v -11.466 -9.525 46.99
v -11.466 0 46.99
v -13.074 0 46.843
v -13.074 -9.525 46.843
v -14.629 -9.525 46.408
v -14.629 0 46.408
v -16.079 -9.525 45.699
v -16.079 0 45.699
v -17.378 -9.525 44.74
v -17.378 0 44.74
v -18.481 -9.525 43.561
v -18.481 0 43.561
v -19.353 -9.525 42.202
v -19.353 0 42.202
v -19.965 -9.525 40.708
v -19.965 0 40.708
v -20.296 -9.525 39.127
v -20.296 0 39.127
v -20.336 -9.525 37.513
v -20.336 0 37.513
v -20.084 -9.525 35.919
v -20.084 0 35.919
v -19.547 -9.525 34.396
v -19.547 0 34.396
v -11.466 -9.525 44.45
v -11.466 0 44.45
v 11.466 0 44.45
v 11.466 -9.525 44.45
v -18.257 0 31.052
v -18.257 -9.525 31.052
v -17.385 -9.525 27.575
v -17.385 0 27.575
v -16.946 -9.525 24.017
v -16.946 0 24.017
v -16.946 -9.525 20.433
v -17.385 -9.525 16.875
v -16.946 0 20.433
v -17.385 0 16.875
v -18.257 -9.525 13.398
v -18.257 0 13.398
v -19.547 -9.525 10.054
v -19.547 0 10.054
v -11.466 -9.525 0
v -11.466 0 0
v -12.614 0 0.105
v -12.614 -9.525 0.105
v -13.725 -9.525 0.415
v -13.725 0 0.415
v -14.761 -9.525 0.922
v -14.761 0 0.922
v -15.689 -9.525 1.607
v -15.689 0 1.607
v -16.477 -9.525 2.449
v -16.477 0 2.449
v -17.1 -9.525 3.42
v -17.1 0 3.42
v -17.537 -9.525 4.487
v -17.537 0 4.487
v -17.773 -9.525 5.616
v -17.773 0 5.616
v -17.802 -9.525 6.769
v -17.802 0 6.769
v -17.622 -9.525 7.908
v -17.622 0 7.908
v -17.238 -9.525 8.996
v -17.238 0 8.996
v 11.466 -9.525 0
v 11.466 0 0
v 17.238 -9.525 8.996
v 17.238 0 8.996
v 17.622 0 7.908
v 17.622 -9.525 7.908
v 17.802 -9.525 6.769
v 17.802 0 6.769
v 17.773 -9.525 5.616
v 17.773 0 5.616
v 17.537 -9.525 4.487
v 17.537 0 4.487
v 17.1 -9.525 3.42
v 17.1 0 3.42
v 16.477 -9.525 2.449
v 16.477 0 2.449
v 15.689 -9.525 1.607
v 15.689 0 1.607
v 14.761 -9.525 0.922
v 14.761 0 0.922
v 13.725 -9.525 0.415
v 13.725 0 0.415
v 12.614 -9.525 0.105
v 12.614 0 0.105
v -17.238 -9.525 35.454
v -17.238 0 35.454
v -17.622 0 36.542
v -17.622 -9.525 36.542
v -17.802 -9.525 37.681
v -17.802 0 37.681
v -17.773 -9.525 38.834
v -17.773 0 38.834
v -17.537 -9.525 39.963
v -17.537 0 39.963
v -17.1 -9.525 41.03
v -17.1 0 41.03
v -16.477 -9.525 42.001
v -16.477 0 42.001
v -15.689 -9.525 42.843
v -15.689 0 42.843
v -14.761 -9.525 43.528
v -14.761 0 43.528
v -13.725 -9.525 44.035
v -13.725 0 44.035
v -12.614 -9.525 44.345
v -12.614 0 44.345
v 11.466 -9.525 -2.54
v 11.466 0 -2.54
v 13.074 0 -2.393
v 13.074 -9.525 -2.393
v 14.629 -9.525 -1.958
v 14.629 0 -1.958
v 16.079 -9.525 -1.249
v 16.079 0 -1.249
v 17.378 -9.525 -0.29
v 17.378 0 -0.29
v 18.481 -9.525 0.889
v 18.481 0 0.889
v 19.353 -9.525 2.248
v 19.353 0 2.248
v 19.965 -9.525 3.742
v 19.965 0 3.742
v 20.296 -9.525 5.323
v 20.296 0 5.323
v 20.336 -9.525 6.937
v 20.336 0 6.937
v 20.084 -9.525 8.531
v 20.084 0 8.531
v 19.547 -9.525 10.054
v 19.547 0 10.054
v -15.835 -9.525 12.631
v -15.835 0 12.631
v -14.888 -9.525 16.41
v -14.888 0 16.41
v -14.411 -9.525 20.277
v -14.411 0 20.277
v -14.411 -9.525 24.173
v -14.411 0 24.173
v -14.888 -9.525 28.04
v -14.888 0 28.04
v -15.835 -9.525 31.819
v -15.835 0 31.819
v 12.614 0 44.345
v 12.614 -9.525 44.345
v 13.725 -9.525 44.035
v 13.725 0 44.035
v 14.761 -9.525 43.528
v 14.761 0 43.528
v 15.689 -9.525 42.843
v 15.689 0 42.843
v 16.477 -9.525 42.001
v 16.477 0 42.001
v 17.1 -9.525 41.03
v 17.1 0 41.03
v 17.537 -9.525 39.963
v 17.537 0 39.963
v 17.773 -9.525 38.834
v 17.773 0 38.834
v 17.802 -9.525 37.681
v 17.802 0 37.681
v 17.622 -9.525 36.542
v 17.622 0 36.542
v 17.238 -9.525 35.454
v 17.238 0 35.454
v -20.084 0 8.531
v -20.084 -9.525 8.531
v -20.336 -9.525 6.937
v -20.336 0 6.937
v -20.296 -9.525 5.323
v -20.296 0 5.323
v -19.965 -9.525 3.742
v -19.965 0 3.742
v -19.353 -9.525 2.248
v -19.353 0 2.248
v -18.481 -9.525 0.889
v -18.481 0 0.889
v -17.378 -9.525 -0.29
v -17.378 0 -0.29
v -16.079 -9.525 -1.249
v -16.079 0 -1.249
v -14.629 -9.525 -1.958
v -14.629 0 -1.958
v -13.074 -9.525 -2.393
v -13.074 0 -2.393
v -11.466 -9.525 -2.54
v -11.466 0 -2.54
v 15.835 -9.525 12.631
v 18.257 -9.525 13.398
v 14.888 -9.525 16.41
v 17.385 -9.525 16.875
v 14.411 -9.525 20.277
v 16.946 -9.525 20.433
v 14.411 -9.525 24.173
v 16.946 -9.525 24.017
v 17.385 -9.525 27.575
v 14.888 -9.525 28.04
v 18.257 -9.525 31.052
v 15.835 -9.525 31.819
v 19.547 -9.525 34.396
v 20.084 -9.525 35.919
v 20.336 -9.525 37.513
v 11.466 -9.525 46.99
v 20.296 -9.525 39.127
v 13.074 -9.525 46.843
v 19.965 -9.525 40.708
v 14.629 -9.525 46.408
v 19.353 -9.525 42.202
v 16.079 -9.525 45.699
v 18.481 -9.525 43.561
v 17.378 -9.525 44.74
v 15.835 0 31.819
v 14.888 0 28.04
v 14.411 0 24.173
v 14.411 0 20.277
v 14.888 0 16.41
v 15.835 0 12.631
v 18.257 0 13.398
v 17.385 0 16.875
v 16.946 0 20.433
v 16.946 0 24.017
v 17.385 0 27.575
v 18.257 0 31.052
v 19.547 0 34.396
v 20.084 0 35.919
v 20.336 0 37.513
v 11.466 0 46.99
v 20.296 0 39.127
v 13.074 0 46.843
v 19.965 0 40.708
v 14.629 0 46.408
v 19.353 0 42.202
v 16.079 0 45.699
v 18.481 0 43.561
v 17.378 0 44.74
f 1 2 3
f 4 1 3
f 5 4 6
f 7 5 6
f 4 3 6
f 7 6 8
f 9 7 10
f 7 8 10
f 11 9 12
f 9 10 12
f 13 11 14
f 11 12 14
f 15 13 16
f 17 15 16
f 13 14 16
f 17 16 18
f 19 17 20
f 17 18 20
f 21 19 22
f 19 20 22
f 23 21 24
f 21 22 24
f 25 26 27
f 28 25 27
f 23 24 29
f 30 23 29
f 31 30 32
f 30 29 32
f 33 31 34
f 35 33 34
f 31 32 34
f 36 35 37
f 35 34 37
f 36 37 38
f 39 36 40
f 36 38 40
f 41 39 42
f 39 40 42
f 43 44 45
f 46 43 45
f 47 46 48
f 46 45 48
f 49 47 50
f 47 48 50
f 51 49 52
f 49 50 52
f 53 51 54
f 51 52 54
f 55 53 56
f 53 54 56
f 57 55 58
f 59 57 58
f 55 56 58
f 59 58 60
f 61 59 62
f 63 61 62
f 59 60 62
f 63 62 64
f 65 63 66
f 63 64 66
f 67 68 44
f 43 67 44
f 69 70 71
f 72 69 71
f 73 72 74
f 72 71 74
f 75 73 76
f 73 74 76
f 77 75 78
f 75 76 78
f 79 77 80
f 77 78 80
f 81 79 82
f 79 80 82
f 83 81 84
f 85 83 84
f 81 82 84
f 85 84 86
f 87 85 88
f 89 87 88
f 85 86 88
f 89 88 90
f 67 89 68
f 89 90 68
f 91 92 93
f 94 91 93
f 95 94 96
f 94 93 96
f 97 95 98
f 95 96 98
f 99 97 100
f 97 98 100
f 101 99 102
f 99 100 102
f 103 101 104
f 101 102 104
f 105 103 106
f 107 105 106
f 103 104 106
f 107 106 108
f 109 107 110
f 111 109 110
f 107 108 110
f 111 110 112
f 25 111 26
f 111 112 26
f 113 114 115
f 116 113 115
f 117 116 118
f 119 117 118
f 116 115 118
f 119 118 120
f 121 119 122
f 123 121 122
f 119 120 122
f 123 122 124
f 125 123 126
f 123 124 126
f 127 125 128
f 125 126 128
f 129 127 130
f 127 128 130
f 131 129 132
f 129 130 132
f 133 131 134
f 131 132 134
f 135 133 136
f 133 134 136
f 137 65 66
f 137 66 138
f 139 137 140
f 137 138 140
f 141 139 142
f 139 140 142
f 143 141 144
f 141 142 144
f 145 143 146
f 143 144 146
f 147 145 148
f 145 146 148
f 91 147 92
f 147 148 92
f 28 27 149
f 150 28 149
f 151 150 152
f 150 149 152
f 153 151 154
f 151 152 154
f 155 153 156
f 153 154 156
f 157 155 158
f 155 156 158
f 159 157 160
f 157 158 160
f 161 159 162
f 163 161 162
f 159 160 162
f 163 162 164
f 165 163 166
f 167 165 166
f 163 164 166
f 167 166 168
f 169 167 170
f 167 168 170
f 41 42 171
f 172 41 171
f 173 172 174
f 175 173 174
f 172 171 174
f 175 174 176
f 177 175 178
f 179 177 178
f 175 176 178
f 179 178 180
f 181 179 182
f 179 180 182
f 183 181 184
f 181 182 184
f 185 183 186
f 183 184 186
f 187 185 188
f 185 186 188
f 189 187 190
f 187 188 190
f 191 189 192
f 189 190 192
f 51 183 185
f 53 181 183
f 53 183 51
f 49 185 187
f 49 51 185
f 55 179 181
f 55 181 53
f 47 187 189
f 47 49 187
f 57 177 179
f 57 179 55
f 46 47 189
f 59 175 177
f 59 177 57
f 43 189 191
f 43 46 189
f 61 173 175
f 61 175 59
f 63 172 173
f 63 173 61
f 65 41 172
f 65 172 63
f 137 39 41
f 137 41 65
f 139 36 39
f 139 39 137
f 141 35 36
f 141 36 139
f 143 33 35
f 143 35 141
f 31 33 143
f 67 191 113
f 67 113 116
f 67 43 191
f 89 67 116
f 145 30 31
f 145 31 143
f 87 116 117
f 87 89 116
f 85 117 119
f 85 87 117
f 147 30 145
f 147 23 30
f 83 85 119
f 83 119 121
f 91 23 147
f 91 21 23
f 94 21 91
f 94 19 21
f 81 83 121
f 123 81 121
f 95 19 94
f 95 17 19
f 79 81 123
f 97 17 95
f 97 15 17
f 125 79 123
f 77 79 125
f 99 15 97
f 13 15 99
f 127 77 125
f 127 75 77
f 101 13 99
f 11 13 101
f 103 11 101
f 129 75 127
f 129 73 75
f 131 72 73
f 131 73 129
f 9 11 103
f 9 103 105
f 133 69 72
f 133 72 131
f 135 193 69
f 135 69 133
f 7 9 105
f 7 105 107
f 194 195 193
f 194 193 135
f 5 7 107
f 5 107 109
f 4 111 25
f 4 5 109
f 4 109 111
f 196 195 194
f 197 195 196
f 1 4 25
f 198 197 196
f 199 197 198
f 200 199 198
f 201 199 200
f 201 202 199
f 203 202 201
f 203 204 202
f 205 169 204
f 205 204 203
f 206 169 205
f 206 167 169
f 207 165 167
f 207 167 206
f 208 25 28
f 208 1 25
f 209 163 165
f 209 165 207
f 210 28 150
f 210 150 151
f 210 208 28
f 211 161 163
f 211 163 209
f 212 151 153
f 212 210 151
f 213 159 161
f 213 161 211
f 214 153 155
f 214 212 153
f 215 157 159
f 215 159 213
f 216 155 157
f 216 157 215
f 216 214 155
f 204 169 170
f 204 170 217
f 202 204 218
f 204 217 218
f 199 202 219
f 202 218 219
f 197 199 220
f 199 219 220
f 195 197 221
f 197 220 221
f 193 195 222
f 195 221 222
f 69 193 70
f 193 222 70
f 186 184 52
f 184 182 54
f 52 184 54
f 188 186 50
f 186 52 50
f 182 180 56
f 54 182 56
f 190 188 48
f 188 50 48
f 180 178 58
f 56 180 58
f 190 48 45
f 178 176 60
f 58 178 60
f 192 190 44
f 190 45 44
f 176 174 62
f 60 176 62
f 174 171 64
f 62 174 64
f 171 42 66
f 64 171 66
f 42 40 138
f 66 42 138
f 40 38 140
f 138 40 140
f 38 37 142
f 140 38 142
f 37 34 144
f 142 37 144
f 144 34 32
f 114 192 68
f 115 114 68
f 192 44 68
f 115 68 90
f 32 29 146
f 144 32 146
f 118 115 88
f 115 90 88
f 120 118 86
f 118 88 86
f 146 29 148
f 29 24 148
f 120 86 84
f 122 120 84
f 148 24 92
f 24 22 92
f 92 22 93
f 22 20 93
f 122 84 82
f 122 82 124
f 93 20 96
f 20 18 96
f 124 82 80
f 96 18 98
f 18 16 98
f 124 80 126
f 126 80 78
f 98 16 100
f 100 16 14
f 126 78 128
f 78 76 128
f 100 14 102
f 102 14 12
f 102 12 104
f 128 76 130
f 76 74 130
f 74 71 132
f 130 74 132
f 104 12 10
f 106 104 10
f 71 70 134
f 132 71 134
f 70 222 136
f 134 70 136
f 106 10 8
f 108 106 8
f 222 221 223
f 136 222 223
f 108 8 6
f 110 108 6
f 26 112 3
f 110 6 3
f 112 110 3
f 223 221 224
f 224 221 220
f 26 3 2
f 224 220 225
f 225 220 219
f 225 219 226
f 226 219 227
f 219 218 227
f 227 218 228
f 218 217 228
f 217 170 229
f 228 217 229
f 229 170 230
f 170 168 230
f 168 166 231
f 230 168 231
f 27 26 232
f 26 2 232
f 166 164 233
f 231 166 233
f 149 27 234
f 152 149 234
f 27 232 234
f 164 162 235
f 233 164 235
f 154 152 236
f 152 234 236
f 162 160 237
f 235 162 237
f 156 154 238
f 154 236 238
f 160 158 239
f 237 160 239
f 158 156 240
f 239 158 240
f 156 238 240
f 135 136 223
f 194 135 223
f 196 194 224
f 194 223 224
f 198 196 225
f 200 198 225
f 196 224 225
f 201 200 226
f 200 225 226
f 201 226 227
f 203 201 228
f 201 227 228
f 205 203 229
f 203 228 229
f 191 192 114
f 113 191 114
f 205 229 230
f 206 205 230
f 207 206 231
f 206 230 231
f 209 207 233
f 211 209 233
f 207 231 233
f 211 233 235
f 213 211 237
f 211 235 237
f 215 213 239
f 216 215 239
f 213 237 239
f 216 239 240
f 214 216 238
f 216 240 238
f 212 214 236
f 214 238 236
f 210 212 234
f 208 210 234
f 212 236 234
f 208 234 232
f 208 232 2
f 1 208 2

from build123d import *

# Parameters (mm, degrees)
F1_DEPTH = 9.525


with BuildPart() as f1:
    # F0 (on Front) → F1 (new body)
    with BuildSketch(Plane.XZ):
        with BuildLine():
            ThreePointArc((-19.547377, 34.395833), (-16.891, 22.225), (-19.547377, 10.054167))
            ThreePointArc((-19.547377, 10.054167), (-18.947889, 1.548851), (-11.465839, -2.54))
            Line((-11.465839, -2.54), (0, -2.54))
            Line((0, -2.54), (11.465839, -2.54))
            ThreePointArc((11.465839, -2.54), (18.947889, 1.548851), (19.547377, 10.054167))
            ThreePointArc((19.547377, 10.054167), (16.891, 22.225), (19.547377, 34.395833))
            ThreePointArc((19.547377, 34.395833), (18.947889, 42.901149), (11.465839, 46.99))
            Line((11.465839, 46.99), (0, 46.99))
            Line((0, 46.99), (-11.465839, 46.99))
            ThreePointArc((-11.465839, 46.99), (-18.947889, 42.901149), (-19.547377, 34.395833))
        make_face()
        with BuildLine():
            Line((11.465839, 0), (0, 0))
            Line((0, 0), (-11.465839, 0))
            ThreePointArc((-11.465839, 0), (-16.81016, 2.920608), (-17.238366, 8.995833))
            ThreePointArc((-17.238366, 8.995833), (-14.351, 22.225), (-17.238366, 35.454167))
            ThreePointArc((-17.238366, 35.454167), (-16.81016, 41.529392), (-11.465839, 44.45))
            Line((-11.465839, 44.45), (0, 44.45))
            Line((0, 44.45), (11.465839, 44.45))
            ThreePointArc((11.465839, 44.45), (16.81016, 41.529392), (17.238366, 35.454167))
            ThreePointArc((17.238366, 35.454167), (14.351, 22.225), (17.238366, 8.995833))
            ThreePointArc((17.238366, 8.995833), (16.81016, 2.920608), (11.465839, 0))
        make_face(mode=Mode.SUBTRACT)
    extrude(amount=F1_DEPTH)


solid = f1.part
